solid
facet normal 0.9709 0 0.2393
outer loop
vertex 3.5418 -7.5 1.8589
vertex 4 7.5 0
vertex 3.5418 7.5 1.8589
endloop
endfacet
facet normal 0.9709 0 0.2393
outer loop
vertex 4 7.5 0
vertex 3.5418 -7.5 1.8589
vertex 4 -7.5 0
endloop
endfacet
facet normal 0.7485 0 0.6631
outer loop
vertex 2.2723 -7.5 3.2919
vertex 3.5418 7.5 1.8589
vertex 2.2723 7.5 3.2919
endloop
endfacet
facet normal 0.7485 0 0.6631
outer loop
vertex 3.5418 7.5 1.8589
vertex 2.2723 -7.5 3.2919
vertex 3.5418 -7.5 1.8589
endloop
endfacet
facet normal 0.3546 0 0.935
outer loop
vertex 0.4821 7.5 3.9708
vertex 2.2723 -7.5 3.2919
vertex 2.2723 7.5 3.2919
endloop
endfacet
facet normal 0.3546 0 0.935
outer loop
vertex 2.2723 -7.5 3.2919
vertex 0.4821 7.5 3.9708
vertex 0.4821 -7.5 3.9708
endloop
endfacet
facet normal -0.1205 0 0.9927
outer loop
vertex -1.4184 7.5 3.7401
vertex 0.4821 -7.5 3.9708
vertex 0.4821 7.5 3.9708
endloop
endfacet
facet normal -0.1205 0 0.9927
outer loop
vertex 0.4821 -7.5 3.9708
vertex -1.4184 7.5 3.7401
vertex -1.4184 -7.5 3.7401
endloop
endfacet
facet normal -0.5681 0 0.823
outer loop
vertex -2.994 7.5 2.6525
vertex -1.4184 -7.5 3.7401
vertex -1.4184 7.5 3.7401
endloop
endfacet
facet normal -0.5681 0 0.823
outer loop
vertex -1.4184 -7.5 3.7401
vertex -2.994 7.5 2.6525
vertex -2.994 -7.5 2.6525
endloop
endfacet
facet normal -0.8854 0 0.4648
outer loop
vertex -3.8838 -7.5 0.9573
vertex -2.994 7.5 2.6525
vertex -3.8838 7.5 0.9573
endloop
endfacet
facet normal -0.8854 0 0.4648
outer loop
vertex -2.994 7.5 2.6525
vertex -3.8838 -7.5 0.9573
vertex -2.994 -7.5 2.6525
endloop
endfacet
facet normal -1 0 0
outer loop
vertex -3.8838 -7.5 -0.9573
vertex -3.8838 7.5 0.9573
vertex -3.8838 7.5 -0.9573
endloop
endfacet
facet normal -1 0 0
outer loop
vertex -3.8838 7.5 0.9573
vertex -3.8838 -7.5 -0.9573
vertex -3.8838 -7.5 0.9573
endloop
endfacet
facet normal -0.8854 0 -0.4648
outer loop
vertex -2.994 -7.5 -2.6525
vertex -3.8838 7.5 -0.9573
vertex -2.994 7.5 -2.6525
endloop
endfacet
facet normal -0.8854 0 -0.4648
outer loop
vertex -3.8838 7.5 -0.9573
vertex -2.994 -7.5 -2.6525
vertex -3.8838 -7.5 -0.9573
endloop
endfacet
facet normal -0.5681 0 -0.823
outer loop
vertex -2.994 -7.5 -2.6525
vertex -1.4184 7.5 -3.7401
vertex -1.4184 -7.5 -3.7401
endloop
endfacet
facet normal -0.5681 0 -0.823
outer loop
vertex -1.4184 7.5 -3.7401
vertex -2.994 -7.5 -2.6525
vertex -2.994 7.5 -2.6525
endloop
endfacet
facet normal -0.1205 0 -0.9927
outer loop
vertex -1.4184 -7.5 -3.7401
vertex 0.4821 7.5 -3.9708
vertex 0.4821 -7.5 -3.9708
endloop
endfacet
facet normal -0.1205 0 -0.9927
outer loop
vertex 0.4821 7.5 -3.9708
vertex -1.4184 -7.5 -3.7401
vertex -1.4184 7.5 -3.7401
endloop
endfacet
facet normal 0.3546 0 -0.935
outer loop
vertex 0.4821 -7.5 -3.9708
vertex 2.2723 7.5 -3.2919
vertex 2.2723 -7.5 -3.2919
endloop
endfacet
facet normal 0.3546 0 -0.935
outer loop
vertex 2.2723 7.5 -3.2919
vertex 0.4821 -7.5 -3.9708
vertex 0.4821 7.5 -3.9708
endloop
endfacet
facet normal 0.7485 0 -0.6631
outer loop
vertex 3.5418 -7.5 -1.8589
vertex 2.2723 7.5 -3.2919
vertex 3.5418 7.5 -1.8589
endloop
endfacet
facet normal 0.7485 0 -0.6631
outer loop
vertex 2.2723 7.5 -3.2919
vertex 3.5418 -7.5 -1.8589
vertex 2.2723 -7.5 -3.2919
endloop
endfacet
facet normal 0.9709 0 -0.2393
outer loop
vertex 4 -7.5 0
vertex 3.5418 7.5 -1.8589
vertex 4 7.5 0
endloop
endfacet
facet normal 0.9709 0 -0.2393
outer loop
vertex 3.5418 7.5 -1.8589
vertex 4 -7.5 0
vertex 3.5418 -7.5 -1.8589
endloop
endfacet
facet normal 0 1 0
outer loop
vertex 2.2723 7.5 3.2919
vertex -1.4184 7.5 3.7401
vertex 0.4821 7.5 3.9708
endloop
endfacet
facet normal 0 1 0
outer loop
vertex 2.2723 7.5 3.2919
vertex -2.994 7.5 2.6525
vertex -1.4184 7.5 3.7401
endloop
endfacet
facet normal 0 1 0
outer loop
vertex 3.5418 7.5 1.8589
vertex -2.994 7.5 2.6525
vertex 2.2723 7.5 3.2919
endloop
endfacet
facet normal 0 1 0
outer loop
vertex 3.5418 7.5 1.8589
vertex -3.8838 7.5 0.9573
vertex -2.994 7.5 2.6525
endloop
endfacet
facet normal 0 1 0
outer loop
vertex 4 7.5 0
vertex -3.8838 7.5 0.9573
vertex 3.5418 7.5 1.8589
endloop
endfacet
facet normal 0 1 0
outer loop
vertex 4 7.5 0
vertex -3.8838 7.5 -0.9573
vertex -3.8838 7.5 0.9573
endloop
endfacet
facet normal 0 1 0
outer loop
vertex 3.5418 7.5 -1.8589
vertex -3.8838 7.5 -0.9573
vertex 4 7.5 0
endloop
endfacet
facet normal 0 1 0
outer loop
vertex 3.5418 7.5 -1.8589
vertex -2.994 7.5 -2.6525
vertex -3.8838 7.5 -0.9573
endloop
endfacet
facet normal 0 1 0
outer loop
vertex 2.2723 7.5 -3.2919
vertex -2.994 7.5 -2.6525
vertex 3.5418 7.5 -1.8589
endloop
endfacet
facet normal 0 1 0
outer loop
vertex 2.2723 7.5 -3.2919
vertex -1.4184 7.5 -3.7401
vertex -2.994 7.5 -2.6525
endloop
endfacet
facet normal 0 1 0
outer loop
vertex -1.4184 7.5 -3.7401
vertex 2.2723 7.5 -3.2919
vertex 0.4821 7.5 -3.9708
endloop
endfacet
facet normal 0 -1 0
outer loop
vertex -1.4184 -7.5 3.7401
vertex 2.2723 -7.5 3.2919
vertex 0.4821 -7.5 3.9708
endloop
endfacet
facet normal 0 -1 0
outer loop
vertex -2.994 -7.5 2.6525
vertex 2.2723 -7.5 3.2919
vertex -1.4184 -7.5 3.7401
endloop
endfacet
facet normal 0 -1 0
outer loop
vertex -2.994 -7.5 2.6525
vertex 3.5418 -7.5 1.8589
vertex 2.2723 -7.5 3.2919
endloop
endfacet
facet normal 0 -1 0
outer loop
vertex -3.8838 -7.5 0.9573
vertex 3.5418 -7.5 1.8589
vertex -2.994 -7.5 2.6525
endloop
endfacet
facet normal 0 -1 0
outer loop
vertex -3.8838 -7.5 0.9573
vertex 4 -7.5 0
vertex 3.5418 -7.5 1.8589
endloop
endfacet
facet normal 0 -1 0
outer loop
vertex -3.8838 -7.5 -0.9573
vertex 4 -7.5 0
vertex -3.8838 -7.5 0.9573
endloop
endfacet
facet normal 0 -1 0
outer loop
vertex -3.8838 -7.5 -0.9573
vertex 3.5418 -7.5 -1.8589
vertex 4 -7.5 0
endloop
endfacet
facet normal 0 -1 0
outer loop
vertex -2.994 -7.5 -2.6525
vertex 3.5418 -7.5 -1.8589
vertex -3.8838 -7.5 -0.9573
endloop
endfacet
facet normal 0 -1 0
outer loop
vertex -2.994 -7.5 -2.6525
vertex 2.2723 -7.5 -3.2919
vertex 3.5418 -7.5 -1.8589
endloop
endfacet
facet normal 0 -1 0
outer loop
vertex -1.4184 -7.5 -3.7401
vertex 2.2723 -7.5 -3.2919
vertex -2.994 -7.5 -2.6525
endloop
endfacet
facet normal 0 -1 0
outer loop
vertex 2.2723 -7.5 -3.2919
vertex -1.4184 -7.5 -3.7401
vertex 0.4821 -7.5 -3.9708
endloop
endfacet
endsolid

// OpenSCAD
rotate([90, 0 , 0])
    cylinder(h = 15, r = 4, center = true);
